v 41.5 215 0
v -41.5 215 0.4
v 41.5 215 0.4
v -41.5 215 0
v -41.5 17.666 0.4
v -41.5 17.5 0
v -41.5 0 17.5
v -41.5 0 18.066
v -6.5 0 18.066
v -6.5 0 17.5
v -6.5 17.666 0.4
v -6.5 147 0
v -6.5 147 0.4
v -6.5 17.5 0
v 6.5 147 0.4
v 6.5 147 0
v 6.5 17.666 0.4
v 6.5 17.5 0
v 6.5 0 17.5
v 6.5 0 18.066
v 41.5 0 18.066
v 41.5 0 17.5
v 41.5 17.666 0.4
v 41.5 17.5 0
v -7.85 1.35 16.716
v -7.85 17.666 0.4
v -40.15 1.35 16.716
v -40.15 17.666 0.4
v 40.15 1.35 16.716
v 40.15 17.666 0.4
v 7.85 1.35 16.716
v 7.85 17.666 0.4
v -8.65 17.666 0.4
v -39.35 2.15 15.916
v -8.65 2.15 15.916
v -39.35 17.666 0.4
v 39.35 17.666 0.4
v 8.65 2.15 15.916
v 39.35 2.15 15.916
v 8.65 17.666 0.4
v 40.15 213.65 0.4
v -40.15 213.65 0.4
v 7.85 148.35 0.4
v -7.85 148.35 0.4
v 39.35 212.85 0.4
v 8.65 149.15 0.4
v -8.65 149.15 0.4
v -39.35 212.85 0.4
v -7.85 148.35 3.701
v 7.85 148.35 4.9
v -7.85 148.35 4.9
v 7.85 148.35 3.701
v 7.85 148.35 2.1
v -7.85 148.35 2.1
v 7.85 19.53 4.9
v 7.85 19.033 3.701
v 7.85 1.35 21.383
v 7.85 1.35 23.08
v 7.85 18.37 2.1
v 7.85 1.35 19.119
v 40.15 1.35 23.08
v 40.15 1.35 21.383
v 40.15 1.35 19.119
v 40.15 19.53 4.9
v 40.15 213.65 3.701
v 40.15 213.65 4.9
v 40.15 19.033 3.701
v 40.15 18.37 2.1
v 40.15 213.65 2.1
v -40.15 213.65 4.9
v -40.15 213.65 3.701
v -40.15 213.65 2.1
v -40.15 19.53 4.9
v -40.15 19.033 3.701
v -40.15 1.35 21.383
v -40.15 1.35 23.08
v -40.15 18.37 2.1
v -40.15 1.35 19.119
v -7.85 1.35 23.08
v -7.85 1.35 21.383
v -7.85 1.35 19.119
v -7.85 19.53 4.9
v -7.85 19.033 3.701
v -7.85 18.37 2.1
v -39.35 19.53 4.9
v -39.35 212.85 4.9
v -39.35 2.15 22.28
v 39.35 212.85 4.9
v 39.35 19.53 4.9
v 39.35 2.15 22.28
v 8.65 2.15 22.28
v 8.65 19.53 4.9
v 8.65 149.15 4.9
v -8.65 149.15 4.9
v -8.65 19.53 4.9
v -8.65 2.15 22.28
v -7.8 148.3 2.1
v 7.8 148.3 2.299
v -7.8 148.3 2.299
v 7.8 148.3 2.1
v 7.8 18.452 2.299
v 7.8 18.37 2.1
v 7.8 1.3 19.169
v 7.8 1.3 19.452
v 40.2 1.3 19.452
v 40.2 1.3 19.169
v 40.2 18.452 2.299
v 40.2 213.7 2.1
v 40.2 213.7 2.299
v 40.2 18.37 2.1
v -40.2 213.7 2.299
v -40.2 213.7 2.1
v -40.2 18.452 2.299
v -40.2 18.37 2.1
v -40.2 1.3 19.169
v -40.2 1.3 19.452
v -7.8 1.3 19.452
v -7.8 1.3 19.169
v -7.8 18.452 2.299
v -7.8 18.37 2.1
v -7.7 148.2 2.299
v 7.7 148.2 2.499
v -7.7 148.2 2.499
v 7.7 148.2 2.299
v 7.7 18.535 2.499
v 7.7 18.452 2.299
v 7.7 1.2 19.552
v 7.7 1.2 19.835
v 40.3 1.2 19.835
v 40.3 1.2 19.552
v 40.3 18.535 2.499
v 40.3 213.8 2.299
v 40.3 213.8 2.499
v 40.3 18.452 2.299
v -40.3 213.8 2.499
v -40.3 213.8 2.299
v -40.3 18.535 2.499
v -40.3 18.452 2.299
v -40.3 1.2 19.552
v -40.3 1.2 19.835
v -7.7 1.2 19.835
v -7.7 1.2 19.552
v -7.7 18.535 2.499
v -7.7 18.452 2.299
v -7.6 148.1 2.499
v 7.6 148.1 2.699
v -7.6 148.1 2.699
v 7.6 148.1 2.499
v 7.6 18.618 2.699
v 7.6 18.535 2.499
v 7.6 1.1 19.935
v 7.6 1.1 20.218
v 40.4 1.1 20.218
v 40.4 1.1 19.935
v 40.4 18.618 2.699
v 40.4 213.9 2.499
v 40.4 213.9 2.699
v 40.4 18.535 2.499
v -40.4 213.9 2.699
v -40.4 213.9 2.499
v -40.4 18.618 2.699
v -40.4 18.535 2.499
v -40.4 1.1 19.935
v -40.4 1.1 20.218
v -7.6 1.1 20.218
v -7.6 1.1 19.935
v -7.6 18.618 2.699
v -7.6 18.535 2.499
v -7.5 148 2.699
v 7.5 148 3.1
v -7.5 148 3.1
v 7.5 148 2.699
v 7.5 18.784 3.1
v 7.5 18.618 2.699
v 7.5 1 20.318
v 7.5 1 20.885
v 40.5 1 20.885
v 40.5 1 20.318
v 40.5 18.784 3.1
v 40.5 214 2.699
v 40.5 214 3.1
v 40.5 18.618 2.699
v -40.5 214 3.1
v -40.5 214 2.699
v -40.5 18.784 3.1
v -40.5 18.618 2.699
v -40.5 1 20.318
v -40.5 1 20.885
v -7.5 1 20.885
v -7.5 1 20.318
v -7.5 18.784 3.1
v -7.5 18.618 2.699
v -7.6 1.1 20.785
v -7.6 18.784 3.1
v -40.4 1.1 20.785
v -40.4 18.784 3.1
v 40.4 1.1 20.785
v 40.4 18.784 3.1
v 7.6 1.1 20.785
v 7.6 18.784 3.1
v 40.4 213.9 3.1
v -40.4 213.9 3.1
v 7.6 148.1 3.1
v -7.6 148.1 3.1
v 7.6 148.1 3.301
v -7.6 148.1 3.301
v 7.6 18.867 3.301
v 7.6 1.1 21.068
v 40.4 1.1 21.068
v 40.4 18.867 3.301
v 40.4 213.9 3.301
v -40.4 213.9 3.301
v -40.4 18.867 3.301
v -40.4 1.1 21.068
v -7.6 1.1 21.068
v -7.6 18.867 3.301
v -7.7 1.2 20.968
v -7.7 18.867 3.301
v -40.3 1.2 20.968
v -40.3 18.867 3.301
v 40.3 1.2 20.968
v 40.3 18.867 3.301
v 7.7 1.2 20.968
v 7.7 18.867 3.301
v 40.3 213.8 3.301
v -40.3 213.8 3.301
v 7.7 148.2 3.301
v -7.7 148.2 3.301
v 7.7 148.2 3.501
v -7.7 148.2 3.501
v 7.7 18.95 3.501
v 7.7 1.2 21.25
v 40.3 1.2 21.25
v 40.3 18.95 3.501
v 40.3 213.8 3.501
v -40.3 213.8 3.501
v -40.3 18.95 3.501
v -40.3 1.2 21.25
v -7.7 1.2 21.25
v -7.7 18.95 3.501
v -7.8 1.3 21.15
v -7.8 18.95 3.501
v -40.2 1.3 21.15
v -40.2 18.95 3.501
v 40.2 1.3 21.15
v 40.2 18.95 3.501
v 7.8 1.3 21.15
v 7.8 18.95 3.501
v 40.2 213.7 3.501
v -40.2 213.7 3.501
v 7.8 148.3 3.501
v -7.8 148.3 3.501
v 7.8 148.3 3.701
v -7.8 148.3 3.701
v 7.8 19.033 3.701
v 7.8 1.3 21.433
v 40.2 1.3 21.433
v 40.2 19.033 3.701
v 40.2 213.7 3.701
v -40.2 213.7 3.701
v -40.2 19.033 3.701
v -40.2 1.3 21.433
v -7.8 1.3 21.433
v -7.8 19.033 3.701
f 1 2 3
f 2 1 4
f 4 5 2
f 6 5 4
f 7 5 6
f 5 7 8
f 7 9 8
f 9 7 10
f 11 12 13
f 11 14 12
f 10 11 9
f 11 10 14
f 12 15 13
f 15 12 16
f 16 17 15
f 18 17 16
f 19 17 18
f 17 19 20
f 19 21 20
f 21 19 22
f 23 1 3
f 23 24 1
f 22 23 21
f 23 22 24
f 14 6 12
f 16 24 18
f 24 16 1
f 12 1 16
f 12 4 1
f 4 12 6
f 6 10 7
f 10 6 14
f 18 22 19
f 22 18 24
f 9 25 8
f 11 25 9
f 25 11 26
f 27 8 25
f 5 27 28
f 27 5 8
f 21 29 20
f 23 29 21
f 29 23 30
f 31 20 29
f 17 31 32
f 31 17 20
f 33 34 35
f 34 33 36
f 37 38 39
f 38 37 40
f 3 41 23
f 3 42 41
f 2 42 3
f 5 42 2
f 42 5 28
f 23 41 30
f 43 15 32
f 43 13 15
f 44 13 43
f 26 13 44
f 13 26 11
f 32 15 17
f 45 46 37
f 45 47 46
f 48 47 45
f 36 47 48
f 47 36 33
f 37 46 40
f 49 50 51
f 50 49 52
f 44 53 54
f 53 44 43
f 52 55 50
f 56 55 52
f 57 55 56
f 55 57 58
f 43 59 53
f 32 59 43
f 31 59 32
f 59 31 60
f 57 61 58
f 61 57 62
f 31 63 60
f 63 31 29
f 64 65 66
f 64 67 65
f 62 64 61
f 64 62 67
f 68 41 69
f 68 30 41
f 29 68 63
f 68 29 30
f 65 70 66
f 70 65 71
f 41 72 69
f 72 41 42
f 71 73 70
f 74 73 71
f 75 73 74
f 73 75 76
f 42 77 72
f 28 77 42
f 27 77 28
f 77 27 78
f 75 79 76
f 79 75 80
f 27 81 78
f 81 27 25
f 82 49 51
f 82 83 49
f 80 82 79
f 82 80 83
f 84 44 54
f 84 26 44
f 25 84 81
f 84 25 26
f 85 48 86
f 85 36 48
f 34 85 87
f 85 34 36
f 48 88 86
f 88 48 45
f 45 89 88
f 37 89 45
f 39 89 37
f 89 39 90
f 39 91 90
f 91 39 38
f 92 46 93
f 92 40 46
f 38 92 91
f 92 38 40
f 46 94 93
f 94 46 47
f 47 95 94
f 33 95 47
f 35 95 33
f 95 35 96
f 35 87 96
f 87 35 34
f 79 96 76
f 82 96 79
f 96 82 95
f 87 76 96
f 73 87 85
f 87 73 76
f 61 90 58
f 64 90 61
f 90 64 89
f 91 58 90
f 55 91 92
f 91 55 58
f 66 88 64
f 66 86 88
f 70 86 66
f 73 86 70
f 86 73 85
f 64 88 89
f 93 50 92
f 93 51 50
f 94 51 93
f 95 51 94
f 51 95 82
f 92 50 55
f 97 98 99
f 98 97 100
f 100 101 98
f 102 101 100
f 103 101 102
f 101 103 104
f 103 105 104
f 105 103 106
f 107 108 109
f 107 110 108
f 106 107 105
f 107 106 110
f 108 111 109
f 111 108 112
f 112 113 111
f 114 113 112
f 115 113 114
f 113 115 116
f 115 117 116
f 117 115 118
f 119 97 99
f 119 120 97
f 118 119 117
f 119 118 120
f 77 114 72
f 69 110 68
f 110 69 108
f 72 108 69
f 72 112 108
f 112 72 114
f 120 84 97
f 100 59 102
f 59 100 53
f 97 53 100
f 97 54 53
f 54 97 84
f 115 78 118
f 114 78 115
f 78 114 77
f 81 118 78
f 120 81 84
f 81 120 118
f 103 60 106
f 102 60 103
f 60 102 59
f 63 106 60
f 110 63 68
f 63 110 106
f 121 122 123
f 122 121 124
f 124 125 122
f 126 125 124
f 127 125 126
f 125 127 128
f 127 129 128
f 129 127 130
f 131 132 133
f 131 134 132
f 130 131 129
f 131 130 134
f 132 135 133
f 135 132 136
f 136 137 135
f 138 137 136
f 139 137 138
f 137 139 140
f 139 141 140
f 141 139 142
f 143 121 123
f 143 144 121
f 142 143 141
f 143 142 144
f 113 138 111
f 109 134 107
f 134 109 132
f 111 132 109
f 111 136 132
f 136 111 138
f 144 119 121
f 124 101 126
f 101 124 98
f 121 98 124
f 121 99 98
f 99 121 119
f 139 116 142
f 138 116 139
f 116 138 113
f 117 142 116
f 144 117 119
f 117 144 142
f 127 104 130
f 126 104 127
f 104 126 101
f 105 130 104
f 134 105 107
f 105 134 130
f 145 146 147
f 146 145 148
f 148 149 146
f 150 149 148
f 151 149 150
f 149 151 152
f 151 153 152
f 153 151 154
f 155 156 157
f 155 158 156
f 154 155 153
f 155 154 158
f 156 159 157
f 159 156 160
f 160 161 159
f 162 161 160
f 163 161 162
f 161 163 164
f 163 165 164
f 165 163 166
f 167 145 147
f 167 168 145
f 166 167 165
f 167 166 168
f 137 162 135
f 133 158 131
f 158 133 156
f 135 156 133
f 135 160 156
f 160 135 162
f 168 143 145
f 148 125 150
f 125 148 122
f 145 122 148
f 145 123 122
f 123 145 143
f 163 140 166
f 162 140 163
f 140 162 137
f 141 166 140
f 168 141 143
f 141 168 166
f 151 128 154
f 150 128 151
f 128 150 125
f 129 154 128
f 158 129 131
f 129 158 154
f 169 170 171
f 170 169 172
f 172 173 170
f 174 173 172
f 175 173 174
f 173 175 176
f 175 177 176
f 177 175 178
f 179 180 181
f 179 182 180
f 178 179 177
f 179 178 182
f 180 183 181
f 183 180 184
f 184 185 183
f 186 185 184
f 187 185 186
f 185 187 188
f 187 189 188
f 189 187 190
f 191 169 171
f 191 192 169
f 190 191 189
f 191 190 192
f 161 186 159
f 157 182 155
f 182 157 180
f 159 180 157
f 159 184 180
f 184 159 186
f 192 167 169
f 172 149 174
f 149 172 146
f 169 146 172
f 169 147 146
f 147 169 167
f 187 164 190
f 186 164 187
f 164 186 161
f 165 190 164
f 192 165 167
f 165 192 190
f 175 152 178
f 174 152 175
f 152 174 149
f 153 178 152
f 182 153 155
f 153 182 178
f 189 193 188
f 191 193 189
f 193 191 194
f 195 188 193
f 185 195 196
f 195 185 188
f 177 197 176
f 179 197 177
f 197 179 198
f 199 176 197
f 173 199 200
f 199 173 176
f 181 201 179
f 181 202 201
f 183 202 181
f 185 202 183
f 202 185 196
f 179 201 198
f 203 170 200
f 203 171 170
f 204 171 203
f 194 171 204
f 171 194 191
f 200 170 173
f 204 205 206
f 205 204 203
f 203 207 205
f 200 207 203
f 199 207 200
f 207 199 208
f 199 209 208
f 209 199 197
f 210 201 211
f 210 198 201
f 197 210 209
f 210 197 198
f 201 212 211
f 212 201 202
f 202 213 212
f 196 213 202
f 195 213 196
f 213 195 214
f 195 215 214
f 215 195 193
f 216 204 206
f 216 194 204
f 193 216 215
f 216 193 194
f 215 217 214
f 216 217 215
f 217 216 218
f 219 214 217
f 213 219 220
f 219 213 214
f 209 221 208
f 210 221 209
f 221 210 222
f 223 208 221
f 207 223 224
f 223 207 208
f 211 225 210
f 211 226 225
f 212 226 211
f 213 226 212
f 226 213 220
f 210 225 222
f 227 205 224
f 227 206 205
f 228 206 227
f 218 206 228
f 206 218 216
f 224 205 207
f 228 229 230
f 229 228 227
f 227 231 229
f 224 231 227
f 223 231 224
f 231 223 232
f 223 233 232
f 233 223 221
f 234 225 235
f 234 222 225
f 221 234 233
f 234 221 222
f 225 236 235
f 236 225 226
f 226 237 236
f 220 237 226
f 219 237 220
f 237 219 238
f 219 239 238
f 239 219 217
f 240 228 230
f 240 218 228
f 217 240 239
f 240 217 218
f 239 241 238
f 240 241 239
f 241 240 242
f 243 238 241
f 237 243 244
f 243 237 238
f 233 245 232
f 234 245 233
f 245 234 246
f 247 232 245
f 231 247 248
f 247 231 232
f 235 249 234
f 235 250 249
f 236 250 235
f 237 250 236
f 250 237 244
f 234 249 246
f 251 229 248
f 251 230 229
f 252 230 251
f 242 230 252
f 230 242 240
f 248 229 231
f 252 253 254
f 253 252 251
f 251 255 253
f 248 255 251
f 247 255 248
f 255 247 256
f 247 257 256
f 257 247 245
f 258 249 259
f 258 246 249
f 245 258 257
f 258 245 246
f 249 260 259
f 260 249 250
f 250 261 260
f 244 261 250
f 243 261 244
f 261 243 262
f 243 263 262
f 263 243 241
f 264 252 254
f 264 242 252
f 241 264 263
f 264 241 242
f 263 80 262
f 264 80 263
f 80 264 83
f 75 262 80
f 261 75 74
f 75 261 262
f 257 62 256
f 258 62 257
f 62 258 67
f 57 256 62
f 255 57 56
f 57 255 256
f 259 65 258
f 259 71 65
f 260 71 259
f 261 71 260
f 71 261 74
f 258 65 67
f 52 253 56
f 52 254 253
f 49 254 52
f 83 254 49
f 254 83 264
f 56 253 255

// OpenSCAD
// file: ../../lib/util.scad
// ==========================================================================
//  Turtle Body -- shared helper modules and functions
// --------------------------------------------------------------------------
//  Small pieces that were copy-pasted across the standalone files. Geometry
//  lives in the per-subsystem lib/ modules; this file is only glue.
//
//  Definitions only -- no top-level geometry, no top-level assignments.
// ==========================================================================

use <params.scad>

// Colour wrapper for wooden parts. When colour coding is off, every wooden
// component renders in one neutral wood tone; bottles, hardware, sails and
// printed parts keep their own colours and never call this.
module wood_color(coded_color, enabled = true, neutral = [0.94, 0.83, 0.62]) {
    color(enabled ? coded_color : neutral) children();
}

// scalar clamp
function clamp(v, lo, hi) = v < lo ? lo : (v > hi ? hi : v);

// Visual-only M6 bolt: plain shaft + hex-less cylindrical head. No thread,
// no torque rating -- a placeholder for fit inspection.
//  Local Z=0 is the underside of the head; the shaft runs toward +Z from Z=0
//  (plus an optional tip_extension), the head sits at Z=-head_t..0. Matches
//  the standalone files.
module m6_bolt_placeholder(grip_length, tip_extension = 1,
                           shaft_d = undef, head_d = undef, head_t = undef,
                           color_rgb = [0.15, 0.15, 0.15], fn = 48) {
    sd = shaft_d == undef ? p_m6_bolt_shaft_d() : shaft_d;
    hd = head_d  == undef ? p_m6_bolt_head_d()  : head_d;
    ht = head_t  == undef ? p_m6_bolt_head_t()  : head_t;
    assert(grip_length > 0, "m6_bolt_placeholder: grip_length must be positive.");
    color(color_rgb)
        union() {
            cylinder(d = sd, h = grip_length + tip_extension, $fn = fn);
            translate([0, 0, -ht])
                cylinder(d = hd, h = ht, $fn = fn);
        }
}

// Regular hexagonal prism specified by across-flats width (OpenSCAD's
// cylinder($fn=6) is specified across corners, which is the usual trap).
module hex_prism_af(across_flats, h, center = false) {
    cylinder(d = across_flats / cos(30), h = h, $fn = 6, center = center);
}
// main file
/*
 Hope Turtle sand ballast container -- lid (snap-on lid). Units: mm. License: CERN-OHL-S-2.0.
 EXPERIMENTAL -- not built, filled or tested.
 A 3D-printed U-shaped box that slides into the gap between the bottom
 bottle's base and the ballast's orange bottom board, its two arms either
 side of the yellow ballast fin. Fill the tray with sand, click the lid on,
 slide it under the bottle. Walls 0.4 mm (one extrusion line).
 Print plate down, skirt up (part="print", the default) -- no support.
 The matching tray is Sand_Ballast_Container_Bottom.scad.

 SOURCE FILE — geometry lives in lib/sand_ballast.scad + lib/params.scad.
 The committed self-contained file is generated by build/build.py.
*/

/* [Display] */
part = "print"; // [print,closed]  -- print = this piece alone in its print pose; closed = tray + lid together

use <../../lib/sand_ballast.scad>

sand_ballast_echo();

if (part == "print") {
    sand_ballast_lid_print();
} else if (part == "closed") {
    sand_ballast_closed();
} else {
    assert(false, str("Unknown part: ", part));
}
